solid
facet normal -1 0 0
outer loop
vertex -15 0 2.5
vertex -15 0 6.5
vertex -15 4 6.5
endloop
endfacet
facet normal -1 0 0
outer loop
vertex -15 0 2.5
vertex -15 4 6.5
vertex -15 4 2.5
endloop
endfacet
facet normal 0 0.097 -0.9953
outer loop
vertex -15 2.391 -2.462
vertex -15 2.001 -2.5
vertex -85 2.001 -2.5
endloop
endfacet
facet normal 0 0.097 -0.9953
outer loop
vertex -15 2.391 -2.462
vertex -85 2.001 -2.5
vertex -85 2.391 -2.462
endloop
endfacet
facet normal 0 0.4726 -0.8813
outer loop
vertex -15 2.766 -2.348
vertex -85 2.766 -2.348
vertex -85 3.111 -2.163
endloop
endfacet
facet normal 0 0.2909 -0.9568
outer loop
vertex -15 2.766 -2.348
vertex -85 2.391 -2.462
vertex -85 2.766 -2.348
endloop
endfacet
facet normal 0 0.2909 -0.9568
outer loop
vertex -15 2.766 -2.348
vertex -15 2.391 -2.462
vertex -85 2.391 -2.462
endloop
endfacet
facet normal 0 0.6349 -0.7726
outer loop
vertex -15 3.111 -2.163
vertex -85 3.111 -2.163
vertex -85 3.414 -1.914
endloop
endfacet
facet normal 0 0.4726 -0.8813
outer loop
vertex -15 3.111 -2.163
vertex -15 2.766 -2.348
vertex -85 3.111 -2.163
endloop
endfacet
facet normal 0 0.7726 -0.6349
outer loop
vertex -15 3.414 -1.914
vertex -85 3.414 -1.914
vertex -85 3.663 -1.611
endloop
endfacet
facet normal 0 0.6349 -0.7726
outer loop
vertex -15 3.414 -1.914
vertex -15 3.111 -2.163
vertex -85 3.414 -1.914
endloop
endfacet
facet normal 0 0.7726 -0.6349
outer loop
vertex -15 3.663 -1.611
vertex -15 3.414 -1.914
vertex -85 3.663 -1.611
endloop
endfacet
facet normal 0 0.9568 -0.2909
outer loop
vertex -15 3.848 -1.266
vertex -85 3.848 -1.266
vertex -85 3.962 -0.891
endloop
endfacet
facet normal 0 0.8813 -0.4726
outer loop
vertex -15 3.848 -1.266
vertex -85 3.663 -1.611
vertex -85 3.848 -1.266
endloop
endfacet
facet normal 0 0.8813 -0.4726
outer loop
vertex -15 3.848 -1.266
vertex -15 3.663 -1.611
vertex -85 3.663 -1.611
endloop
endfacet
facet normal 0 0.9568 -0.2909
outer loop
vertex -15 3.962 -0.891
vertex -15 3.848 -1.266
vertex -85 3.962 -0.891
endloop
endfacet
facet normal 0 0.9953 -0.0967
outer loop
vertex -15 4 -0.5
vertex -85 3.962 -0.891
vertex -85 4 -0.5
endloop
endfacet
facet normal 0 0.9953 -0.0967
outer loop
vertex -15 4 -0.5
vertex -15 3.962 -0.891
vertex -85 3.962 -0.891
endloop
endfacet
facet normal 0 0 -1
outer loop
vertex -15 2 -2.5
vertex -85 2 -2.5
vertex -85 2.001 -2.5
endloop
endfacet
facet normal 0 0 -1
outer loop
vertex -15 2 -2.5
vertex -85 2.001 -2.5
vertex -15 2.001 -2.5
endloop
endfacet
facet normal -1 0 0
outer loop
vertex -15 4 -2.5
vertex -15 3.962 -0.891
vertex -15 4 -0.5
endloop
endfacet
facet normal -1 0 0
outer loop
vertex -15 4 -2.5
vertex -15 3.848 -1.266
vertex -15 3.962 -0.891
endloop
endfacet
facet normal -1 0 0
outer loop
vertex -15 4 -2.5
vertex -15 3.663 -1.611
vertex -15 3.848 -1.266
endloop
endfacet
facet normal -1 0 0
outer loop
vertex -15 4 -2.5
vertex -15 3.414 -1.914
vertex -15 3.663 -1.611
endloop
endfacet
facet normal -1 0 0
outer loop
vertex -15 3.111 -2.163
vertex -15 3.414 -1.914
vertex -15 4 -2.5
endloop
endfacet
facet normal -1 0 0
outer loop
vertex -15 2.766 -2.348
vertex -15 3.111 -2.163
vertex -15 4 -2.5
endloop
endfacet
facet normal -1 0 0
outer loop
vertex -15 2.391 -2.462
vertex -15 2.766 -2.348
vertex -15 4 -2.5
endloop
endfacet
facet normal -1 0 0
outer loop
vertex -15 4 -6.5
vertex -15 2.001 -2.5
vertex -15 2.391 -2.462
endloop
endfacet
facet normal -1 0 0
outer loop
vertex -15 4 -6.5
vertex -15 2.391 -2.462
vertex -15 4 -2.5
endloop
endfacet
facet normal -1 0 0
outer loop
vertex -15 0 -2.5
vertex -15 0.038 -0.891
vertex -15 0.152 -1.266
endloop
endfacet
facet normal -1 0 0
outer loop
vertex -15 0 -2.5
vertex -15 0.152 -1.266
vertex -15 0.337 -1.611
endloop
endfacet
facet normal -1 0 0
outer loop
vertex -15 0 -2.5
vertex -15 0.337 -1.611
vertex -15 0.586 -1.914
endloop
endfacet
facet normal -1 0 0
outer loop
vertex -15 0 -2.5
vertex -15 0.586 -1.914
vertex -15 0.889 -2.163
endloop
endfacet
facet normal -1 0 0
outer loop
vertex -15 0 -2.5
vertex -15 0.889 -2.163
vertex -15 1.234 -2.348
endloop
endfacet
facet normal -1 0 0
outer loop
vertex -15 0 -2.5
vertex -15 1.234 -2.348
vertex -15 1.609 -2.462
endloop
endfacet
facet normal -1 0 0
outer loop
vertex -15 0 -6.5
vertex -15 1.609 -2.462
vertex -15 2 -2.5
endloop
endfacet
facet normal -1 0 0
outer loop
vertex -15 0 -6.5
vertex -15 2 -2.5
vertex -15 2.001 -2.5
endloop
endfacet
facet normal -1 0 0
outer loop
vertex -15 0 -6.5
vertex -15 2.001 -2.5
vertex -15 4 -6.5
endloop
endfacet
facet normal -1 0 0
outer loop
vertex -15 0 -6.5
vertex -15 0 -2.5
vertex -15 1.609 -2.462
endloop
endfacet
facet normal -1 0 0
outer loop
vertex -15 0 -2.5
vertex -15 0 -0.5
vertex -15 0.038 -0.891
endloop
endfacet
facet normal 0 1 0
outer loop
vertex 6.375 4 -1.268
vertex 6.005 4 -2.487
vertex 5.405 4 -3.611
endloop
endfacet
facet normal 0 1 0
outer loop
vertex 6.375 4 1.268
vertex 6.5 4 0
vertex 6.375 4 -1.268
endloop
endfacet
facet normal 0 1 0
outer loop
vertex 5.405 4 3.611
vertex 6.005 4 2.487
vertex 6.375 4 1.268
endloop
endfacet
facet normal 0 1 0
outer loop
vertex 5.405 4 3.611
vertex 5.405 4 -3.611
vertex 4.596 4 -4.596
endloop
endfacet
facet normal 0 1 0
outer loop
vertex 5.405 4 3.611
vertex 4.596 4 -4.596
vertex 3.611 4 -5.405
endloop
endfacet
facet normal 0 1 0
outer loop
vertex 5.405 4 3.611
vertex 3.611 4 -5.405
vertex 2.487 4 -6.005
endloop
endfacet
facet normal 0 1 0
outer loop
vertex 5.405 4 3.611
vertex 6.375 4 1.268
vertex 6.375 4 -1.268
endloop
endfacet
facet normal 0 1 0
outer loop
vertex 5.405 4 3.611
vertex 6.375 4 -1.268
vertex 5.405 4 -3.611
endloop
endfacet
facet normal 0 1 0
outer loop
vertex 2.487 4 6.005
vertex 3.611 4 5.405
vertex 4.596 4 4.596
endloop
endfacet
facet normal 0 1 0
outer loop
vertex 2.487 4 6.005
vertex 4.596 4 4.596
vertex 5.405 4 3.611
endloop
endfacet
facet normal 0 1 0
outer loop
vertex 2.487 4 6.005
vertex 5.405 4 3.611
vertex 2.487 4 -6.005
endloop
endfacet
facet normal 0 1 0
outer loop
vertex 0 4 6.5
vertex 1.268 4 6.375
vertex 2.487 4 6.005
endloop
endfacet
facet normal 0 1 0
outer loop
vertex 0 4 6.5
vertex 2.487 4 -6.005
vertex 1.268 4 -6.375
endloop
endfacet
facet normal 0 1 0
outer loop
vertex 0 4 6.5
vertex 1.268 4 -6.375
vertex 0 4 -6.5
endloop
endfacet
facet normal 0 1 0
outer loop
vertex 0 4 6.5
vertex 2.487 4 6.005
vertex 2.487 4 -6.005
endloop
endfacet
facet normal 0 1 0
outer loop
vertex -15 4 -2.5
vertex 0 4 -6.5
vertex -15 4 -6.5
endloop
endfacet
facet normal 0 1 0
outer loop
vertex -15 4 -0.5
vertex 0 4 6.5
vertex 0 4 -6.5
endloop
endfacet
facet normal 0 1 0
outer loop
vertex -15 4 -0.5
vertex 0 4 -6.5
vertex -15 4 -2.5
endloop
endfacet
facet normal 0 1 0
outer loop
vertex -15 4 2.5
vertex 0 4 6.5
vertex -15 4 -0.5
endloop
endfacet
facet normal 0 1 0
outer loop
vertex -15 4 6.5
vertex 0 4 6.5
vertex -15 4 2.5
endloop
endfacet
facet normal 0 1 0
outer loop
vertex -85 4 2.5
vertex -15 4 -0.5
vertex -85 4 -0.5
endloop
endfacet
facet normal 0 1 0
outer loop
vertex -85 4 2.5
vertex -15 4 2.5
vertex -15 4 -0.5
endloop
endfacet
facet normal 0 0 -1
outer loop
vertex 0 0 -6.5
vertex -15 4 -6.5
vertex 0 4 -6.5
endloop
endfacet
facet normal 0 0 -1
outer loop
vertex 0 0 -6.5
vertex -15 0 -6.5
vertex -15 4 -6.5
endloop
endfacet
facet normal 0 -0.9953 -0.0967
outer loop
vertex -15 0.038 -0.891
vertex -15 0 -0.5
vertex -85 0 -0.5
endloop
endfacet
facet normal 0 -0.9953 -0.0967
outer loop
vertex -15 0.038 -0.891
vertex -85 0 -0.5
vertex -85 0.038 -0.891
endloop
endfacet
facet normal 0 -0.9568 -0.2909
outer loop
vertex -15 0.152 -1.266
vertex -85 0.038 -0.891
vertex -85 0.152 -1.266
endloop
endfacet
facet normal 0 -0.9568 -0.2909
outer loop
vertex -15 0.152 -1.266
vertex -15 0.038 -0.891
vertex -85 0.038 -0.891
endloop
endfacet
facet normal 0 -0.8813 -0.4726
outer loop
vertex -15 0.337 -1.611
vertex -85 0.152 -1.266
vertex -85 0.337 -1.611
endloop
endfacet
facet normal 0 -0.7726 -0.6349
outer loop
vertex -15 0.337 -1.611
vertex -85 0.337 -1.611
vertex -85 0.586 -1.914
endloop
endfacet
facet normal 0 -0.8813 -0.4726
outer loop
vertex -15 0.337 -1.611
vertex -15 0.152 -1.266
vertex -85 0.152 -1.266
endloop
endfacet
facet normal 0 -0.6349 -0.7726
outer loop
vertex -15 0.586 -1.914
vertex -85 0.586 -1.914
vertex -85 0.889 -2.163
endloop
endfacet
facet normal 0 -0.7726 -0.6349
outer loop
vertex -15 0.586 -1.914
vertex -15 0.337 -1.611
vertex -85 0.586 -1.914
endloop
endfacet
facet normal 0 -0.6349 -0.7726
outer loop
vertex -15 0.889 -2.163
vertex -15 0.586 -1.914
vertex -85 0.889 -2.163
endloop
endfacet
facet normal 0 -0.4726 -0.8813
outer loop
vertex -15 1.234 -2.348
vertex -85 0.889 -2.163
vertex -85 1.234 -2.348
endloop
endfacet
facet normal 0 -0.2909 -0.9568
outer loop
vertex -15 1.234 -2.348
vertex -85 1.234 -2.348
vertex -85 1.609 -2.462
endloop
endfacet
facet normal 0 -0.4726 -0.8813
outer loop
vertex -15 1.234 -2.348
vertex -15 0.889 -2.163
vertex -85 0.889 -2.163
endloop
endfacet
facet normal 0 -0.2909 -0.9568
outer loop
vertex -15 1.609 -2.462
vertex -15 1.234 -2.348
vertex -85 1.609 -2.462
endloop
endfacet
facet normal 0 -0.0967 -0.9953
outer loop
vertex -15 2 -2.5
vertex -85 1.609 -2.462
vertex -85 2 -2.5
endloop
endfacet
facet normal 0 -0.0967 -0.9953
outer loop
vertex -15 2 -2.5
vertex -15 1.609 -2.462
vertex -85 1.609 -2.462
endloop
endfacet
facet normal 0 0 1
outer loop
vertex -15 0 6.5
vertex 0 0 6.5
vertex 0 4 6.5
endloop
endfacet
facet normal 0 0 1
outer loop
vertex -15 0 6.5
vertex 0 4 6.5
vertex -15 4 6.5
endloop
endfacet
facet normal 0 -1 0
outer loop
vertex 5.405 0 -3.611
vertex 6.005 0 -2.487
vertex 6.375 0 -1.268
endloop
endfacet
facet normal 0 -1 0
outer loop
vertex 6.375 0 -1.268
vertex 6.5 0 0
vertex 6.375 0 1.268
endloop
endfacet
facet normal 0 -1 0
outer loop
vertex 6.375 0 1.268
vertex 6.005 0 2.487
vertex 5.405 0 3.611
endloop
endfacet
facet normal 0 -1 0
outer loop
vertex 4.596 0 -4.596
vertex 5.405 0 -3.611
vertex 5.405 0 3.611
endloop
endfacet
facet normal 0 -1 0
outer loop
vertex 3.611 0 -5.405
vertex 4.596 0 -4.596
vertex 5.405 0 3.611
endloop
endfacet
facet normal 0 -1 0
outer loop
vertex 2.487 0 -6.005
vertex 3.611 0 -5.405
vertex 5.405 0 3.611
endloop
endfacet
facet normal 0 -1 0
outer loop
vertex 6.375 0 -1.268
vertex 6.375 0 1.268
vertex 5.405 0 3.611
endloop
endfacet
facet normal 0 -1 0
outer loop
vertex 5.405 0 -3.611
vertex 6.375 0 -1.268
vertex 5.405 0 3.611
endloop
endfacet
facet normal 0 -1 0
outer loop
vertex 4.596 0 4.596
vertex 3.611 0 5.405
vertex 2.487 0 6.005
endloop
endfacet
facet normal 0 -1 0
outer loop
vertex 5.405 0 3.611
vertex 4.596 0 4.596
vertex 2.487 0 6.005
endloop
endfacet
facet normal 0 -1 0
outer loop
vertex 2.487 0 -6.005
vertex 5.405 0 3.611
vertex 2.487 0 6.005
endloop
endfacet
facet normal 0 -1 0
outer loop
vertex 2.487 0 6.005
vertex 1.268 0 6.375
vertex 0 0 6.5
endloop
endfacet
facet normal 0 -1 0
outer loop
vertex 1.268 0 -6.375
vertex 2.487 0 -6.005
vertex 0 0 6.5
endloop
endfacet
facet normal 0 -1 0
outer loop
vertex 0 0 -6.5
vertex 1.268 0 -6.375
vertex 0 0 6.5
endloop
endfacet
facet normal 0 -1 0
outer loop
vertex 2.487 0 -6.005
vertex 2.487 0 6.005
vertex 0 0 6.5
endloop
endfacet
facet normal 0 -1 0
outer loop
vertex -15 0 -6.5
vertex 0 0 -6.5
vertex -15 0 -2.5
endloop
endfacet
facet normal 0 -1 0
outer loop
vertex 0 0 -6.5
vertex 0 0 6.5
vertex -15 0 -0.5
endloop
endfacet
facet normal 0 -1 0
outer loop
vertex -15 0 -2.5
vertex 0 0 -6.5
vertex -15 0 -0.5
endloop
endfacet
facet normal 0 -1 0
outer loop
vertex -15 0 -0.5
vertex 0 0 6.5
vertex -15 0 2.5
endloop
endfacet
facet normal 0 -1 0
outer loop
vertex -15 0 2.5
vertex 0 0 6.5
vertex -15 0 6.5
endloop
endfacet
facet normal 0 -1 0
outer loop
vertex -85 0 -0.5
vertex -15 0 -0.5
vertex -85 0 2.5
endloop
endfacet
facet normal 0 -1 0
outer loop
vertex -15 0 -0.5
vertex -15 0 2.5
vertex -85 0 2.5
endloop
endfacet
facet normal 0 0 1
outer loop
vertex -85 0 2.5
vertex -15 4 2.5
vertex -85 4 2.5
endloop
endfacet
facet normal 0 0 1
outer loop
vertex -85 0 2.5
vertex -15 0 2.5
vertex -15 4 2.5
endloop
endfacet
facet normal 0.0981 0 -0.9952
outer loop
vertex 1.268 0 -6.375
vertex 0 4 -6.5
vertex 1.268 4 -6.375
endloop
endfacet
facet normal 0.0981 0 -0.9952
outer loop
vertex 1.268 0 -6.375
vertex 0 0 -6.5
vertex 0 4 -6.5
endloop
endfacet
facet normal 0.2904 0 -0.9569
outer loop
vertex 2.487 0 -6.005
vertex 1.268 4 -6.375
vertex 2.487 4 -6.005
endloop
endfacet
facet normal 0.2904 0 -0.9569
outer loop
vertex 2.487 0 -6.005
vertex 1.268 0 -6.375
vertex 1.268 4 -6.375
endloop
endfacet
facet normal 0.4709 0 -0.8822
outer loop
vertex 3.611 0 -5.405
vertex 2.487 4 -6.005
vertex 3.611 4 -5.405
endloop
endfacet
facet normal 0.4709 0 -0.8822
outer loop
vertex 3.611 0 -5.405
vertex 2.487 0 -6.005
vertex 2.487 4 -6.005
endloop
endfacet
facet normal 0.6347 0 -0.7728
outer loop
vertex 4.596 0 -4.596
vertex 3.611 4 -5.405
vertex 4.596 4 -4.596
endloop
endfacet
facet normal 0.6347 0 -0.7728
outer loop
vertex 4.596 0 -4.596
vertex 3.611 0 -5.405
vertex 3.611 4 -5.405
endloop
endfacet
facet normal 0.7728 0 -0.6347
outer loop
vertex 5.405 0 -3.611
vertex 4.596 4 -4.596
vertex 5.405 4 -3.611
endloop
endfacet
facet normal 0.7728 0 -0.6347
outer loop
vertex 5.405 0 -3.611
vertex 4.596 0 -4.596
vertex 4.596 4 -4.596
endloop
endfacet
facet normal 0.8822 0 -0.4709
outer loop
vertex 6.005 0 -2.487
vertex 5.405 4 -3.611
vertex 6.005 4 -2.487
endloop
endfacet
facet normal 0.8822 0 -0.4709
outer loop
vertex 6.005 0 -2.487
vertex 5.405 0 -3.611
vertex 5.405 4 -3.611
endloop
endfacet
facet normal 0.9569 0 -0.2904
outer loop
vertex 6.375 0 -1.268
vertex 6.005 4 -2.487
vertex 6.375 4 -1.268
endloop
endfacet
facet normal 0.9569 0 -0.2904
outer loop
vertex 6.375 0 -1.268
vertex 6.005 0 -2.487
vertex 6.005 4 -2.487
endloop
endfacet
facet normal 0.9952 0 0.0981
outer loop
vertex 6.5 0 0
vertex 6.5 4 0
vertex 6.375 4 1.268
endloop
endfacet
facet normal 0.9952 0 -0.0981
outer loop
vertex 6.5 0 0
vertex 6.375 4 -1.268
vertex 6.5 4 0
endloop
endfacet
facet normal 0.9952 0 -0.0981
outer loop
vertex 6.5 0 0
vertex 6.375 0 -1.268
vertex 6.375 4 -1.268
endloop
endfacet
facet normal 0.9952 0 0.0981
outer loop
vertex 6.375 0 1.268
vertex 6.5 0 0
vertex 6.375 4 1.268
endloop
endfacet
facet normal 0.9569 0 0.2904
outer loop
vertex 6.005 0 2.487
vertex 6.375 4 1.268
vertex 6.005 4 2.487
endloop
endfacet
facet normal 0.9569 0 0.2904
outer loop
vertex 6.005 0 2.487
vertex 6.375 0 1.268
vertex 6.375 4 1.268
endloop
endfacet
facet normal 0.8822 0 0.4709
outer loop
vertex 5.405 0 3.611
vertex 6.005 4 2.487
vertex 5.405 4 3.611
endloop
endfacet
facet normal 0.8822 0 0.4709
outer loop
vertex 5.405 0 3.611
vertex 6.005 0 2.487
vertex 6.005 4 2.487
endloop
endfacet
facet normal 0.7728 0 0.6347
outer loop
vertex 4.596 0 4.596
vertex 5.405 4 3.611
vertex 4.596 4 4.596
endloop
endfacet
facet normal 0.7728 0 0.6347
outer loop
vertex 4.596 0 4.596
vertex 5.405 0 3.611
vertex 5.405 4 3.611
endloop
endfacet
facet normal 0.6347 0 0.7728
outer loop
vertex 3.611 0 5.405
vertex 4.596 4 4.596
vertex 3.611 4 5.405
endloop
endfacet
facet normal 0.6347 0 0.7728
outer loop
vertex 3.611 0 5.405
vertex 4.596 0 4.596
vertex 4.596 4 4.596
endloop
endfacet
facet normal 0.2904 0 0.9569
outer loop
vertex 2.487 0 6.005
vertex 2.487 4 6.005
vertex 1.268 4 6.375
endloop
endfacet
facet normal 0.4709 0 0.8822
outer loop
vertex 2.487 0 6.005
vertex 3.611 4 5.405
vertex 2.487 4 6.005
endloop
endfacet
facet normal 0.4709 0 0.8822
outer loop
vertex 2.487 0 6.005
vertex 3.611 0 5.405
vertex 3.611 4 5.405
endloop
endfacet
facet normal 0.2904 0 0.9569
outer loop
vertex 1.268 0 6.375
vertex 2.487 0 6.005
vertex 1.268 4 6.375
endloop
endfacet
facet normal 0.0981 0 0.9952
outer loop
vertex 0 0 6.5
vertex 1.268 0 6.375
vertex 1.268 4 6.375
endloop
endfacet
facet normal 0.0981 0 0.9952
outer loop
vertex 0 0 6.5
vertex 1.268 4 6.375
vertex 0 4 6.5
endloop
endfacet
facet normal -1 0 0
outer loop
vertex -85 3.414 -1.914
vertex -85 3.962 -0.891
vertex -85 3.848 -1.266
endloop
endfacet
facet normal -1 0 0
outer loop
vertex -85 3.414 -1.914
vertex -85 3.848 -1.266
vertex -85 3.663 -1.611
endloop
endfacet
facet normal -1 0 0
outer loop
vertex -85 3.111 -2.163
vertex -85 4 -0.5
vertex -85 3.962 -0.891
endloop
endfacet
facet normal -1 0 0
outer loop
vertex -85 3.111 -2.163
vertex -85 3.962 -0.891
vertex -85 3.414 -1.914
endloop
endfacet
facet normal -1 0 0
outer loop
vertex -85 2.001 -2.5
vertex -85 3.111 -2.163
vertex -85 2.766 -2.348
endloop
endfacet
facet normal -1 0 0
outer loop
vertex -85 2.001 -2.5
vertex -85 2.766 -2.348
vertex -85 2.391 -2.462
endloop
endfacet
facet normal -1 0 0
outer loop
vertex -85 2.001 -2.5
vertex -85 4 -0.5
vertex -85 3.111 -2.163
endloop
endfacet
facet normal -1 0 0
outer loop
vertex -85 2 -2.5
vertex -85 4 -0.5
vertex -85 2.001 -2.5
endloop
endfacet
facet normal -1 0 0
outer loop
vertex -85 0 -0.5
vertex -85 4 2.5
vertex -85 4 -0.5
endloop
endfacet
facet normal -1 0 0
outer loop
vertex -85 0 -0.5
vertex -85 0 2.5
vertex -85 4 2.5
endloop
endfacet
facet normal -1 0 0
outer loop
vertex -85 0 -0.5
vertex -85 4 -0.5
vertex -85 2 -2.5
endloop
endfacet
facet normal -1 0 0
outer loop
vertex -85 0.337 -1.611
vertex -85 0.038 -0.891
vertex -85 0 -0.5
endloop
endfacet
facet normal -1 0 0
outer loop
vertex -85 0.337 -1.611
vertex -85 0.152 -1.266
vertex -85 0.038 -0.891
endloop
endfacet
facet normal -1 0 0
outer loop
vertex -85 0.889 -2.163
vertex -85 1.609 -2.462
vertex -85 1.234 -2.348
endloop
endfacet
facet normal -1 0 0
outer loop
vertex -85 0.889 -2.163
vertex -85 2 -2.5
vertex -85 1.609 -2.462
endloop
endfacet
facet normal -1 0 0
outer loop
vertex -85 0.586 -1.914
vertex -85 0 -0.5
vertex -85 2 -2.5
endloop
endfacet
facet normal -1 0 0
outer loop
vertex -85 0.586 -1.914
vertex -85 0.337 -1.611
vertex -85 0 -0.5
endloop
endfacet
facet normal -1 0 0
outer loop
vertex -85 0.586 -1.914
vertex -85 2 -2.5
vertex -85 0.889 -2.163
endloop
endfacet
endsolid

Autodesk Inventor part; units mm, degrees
ref_plane "YZ Plane" through (0, 0, 0) normal (1, 0, 0) x (0, 1, 0)
ref_plane "XZ Plane" through (0, 0, 0) normal (0, 1, 0) x (-1, 0, 0)
ref_plane "XY Plane" through (0, 0, 0) normal (0, 0, 1) x (1, 0, 0)
sketch "Sketch1" plane through (0, 0, 0) normal (0, 1, 0) x (-1, 0, 0)
  circle A0 centre (0, 0) radius 6.5
  line L0 (0, 6.5) -> (15, 6.5)
  line L1 (15, 6.5) -> (15, -6.5)
  line L2 (15, -6.5) -> (0, -6.5)
  line L3 (0, -6.5) -> (0, 6.5)
  line L4 (15, 2.5) -> (85, 2.5)
  line L5 (85, 2.5) -> (85, -2.5)
  line L6 (85, -2.5) -> (15, -2.5)
  line L7 (15, -2.5) -> (15, 2.5)
  dimension "d0" = 13
  dimension "d1" = 6.5
  dimension "d2" = 15
  dimension "d3" = 6.5
  dimension "d4" = 70
  dimension "d5" = 4
  dimension "d6" = 4
extrude "Extrusion1" add sketch "Sketch1" along normal blind 4
fillet "Fillet1" radius 2 2 edges at (-50, 4, -2.5) (-50, 0, -2.5)
properties part number "Arms"
